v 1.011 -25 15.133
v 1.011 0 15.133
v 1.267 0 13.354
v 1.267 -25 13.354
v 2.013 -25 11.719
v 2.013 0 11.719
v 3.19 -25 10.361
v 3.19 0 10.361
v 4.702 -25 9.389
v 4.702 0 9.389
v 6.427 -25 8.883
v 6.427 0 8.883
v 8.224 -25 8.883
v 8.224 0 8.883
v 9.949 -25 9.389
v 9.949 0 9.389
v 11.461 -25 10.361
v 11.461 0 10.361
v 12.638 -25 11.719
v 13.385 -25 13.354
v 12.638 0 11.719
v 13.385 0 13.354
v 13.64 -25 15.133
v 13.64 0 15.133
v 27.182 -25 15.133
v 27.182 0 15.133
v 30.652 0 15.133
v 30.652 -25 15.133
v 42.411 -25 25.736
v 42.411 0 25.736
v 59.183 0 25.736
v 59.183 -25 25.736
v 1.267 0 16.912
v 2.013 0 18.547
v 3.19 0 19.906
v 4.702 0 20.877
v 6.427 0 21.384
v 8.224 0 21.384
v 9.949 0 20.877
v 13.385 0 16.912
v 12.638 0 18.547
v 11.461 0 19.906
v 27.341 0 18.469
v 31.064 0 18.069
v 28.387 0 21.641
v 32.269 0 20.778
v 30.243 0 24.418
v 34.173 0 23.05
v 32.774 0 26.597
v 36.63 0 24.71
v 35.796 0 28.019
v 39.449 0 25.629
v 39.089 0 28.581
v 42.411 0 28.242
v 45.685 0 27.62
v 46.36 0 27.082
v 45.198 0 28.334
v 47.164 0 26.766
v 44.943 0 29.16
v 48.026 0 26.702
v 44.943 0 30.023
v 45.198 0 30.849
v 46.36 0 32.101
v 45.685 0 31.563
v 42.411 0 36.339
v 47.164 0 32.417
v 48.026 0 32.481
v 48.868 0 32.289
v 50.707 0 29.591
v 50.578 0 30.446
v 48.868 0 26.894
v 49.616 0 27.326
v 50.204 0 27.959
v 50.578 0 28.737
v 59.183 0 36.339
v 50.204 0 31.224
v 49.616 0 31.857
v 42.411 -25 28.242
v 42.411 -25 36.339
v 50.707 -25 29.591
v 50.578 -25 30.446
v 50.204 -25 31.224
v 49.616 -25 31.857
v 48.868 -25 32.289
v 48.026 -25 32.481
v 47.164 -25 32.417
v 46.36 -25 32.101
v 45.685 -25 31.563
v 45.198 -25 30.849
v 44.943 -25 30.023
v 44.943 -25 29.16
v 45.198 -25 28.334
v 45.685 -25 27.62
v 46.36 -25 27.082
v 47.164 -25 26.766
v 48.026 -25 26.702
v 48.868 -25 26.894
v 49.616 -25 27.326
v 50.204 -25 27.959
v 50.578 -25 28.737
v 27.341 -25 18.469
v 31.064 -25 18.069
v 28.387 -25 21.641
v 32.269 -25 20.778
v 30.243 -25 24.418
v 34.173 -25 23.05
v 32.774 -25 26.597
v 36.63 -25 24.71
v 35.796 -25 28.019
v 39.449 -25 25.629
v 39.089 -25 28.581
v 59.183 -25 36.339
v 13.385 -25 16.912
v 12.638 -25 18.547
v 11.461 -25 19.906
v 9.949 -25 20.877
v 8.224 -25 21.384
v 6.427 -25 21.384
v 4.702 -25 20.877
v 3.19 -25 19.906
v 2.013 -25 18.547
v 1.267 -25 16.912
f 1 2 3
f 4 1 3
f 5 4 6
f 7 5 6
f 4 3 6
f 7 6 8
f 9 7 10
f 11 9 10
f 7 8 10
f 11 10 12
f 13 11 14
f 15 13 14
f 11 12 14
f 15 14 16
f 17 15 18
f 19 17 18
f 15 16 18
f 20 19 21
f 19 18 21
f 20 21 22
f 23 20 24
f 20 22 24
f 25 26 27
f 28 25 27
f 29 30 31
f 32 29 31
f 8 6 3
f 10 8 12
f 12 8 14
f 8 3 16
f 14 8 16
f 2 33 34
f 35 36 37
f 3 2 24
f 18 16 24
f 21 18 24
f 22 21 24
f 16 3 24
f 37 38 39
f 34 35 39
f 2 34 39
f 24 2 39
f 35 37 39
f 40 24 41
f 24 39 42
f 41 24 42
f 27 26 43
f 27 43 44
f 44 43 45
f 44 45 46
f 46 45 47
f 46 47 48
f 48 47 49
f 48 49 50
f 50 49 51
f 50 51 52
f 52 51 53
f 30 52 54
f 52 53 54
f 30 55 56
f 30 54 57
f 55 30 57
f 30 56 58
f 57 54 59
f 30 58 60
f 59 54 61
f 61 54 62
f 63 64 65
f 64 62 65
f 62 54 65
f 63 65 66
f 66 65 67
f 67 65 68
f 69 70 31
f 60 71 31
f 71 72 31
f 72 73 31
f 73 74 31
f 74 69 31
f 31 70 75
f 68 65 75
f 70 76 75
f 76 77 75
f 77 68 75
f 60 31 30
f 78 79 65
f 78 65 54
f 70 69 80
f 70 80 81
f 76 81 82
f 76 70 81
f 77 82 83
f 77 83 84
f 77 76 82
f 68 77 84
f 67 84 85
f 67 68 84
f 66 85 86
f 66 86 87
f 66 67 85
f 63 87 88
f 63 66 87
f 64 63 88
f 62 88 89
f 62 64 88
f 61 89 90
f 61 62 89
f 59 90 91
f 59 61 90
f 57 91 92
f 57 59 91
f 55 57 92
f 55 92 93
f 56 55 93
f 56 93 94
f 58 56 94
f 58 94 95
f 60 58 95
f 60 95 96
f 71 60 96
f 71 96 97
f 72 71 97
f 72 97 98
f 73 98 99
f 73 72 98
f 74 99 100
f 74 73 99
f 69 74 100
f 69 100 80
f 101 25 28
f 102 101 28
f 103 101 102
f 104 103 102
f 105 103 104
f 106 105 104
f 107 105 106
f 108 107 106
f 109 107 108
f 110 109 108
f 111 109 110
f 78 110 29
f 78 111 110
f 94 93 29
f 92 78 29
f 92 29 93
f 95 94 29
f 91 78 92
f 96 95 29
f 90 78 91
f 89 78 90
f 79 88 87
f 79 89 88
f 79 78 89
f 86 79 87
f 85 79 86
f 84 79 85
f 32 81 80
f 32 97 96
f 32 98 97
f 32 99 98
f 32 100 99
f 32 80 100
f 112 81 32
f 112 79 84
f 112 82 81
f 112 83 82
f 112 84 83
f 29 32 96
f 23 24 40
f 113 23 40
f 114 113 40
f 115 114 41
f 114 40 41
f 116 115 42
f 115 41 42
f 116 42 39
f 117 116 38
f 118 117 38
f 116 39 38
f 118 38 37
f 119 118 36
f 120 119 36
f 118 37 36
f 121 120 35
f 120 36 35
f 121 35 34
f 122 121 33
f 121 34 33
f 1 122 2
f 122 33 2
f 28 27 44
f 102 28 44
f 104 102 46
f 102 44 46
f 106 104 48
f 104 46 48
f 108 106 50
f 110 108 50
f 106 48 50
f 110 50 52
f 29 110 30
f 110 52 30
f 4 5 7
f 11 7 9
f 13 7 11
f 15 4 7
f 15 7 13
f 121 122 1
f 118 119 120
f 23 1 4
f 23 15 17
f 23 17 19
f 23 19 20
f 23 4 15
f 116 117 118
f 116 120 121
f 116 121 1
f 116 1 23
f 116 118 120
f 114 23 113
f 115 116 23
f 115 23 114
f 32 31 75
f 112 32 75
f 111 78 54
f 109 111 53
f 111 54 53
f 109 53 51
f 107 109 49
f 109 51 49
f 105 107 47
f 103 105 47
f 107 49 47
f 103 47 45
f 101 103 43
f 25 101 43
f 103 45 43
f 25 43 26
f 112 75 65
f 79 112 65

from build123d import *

# Parameters (mm, degrees)
F1_DEPTH = 25
F0_R     = 2.89809729


with BuildPart() as f1:
    # F0 (on Front) → F1 (new body)
    with BuildSketch(Plane.XZ):
        with BuildLine():
            ThreePointArc((13.6403647707, 15.133109875), (7.3255822062, 21.4478924395), (1.0107996418, 15.133109875))
            Line((1.0107996418, 15.133109875), (13.6403647707, 15.133109875))
        make_face()
        with BuildLine():
            Line((13.6403647707, 15.133109875), (1.0107996418, 15.133109875))
            ThreePointArc((1.0107996418, 15.133109875), (7.3255822062, 8.8183273105), (13.6403647707, 15.133109875))
        make_face()
    extrude(amount=F1_DEPTH)


with BuildPart() as f1b:
    # F0 (on Front) → F1, piece 2 (new body)
    with BuildSketch(Plane.XZ):
        with BuildLine():
            Line((27.1817650646, 15.133109875), (30.6517761201, 15.133109875))
            ThreePointArc((30.6517761201, 15.133109875), (34.1733463019, 23.0499467395), (42.4112640321, 25.7359240204))
            Line((42.4112640321, 25.7359240204), (42.4112640321, 28.2420460135))
            ThreePointArc((42.4112640321, 28.2420460135), (31.4346777756, 25.5932411589), (27.1817650646, 15.133109875))
        make_face()
        Polygon((42.4112640321, 28.2420460135), (42.4112640321, 25.7359240204), (59.1829903424, 25.7359240204), (59.1829903424, 36.3387428224), (42.4112640321, 36.3387428224), align=None)
        with Locations((47.8090569377, 29.5914951712)):
            Circle(F0_R, mode=Mode.SUBTRACT)
    extrude(amount=F1_DEPTH)


solid = Compound([f1.part, f1b.part])
